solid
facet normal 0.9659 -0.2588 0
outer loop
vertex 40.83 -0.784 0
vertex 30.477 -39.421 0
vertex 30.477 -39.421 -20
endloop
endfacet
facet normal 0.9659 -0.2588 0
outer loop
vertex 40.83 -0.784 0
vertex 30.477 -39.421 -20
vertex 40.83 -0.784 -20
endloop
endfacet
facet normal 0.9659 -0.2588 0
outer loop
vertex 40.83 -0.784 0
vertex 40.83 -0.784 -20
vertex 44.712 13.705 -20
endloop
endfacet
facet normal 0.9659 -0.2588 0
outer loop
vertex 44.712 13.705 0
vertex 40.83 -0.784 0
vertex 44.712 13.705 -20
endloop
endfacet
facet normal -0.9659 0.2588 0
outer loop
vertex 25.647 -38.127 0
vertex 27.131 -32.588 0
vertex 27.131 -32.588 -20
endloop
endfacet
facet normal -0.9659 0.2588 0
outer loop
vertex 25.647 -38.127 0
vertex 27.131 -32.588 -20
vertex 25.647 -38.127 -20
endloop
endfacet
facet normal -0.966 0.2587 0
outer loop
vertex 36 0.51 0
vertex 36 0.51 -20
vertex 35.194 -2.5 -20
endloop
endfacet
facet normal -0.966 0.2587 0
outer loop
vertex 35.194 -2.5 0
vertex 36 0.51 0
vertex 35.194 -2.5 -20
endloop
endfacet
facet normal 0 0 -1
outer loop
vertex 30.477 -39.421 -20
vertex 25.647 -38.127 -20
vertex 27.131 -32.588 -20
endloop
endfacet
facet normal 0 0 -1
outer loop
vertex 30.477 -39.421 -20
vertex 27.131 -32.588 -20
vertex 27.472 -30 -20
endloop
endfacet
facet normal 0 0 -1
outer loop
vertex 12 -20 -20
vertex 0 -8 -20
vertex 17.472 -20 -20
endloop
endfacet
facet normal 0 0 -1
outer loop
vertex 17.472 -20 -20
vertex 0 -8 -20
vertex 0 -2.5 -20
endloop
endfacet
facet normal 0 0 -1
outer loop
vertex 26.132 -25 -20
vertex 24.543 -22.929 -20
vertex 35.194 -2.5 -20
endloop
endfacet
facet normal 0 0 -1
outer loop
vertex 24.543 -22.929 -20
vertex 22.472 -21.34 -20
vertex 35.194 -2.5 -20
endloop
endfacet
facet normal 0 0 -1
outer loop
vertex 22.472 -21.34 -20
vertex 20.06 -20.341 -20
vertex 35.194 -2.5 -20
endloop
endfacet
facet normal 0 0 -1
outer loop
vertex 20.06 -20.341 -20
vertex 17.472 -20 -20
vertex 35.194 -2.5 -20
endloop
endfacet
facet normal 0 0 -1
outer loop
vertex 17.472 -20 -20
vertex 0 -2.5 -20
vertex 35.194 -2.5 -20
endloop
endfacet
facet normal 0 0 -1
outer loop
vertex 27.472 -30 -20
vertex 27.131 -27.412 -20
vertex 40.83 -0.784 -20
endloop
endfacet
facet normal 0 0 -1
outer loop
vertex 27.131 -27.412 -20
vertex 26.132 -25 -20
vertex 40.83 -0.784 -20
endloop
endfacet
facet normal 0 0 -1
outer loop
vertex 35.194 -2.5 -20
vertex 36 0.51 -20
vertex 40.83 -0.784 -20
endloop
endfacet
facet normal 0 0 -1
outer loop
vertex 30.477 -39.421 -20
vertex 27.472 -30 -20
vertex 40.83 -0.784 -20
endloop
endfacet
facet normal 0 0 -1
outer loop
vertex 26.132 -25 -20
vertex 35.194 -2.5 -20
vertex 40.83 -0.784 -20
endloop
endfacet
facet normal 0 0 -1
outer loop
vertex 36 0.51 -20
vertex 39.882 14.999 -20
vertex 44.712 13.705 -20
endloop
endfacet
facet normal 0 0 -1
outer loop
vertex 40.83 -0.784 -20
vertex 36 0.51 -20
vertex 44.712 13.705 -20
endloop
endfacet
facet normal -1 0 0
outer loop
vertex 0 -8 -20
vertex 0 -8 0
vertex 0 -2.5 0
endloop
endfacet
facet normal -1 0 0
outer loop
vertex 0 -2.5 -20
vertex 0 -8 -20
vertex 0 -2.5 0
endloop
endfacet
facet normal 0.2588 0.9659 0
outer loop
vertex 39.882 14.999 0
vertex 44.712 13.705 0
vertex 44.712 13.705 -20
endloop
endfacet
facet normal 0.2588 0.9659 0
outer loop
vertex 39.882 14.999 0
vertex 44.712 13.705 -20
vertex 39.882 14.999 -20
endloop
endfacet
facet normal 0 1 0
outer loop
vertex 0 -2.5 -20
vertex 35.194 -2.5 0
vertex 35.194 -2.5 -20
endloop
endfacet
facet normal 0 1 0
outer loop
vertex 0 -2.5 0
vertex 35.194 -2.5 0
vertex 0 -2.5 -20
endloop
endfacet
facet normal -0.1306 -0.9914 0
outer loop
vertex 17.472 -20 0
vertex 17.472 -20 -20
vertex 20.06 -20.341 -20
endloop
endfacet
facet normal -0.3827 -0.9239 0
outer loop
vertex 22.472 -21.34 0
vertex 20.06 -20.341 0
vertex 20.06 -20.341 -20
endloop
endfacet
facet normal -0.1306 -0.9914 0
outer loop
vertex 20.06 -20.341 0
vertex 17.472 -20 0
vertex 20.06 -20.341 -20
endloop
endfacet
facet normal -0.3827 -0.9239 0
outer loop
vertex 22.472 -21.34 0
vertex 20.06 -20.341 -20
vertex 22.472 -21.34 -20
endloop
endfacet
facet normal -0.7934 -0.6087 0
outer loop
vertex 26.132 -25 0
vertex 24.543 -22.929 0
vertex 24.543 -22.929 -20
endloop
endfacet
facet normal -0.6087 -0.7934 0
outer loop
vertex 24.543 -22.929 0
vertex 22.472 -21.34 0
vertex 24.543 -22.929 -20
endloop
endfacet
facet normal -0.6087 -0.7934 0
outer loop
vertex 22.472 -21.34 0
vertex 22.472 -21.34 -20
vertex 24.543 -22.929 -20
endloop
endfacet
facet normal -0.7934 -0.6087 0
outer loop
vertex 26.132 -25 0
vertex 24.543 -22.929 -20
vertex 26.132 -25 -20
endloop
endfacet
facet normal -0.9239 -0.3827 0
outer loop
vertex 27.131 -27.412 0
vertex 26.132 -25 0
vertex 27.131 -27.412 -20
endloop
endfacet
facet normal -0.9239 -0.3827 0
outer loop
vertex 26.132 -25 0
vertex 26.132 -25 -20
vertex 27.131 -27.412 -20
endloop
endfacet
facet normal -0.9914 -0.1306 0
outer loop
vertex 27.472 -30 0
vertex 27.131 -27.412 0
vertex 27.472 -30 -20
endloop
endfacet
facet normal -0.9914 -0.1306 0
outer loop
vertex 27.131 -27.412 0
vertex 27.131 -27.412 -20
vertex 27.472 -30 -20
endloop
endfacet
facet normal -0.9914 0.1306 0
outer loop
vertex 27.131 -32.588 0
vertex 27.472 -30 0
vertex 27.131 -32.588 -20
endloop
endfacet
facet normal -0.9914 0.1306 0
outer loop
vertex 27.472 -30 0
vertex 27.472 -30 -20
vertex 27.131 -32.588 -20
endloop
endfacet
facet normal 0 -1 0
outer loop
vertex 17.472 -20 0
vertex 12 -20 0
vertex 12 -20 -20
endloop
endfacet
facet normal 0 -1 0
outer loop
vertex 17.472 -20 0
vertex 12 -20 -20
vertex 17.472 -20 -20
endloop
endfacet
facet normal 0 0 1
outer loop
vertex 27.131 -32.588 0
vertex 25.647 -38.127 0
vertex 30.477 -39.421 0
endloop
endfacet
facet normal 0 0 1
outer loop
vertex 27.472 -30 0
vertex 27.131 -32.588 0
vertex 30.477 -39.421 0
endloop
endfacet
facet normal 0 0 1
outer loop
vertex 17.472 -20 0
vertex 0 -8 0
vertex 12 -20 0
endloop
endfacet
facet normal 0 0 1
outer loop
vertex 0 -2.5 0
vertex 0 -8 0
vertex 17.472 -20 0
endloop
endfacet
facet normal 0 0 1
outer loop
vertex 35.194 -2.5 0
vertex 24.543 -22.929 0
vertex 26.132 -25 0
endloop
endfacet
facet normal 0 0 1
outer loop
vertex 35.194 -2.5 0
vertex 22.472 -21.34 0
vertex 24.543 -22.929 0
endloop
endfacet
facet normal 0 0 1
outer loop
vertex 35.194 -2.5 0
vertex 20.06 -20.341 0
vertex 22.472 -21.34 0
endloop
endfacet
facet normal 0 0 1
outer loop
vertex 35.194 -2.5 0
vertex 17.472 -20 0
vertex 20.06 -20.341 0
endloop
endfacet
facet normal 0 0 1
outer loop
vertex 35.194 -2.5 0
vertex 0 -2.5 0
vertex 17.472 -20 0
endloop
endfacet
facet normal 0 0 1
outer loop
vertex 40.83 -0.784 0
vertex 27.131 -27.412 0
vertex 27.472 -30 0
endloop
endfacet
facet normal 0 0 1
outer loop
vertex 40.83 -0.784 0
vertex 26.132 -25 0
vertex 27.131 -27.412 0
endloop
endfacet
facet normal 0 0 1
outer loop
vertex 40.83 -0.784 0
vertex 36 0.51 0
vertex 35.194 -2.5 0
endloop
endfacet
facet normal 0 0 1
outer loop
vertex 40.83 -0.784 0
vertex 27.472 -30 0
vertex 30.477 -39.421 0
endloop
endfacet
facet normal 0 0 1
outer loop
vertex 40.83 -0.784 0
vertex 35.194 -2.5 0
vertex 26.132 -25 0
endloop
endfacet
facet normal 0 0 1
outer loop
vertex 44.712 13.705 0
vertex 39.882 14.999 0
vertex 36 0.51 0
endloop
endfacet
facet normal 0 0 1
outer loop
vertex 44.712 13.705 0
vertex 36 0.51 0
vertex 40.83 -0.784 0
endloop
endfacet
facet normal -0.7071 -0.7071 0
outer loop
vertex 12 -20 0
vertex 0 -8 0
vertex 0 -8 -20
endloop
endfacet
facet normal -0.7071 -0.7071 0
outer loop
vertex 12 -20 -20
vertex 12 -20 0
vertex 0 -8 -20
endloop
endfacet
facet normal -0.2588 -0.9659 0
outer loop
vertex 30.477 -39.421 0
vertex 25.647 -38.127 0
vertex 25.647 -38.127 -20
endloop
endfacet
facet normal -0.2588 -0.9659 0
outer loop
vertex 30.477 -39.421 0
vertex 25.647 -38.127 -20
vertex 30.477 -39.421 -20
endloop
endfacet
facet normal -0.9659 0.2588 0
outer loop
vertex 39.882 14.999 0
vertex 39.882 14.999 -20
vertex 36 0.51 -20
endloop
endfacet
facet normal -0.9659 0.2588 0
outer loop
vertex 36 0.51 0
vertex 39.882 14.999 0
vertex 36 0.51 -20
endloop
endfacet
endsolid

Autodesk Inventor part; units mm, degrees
ref_plane "YZ Plane" through (0, 0, 0) normal (1, 0, 0) x (0, 1, 0)
sketch "Sketch1" plane through (0, 0, 0) normal (0, 0, 1) x (1, 0, 0)
  line L0 (36, 0.51) -> (25.6472, -38.1271)
  line L1 (36, 0.51) -> (76, 0.51) construction
  line L2 (36, 0.51) -> (25.6472, -38.1271) construction
  line L3 (25.6472, -38.1271) -> (30.4769, -39.4212)
  line L4 (30.4769, -39.4212) -> (40.8296, -0.7841)
  line L5 (40.8296, -0.7841) -> (36, 0.51)
  line L6 (36, 0.51) -> (40.8296, -0.7841)
  line L7 (40.8296, -0.7841) -> (44.7119, 13.7048)
  line L8 (44.7119, 13.7048) -> (39.8823, 14.9989)
  line L9 (39.8823, 14.9989) -> (36, 0.51)
  arc A0 (36, -1.5) -> (26, 8.5) centre (26, -1.5) ccw construction
  line L10 (39.0787, 12) -> (34.0787, 12)
  line L11 (34.0787, 12) -> (34.0787, 9)
  line L12 (34.0787, 9) -> (38.2749, 9)
  line L13 (14, -12.5) -> (26, -12.5) construction
  line L14 (0, -20) -> (30.5044, -20)
  line L15 (30.5044, -20) -> (35.8634, 0)
  line L16 (35.1935, -2.5) -> (0, -2.5)
  line L17 (35.1935, -2.5) -> (30.5044, -20)
  line L18 (0, -20) -> (0, -2.5)
  line L19 (-41.5, -2.5) -> (36, -2.5) construction
  line L20 (30.5044, -20) -> (35.1935, -2.5) construction
  point P0 (0, 0)
  point P1 (17.5967, -2.5)
  dimension "d0" = 40
  dimension "d1" = 105
  dimension "d2" = 5
  dimension "d3" = 15
  dimension "d5" = 5
  dimension "d6" = 3
  dimension "d7" = 11.49
  dimension "d20" = 17.5
  dimension "d21" = 35.1935
  dimension "d22" = 30.5044
ref_plane "Work Plane1" through (0, 0, -20) normal (0, 0, -1) x (0, 1, 0)
extrude "Extrusion1" add sketch "Sketch1" against normal up to surface (20 mm away) contours L5 L4 L3 L0 | L9 L8 L7 L5 | L0 L14 L18 L16
ref_plane "Work Plane6" through (36, 0, -14) normal (0, 0, 1) x (1, 0, 0)
ref_plane "Work Plane3" through (0, 0.51, -6) normal (0, 0, -1) x (0, 1, 0)
fillet "Fillet2" radius 10 1 edges at (30.5044, -20, -10)
chamfer "Chamfer1" distance 12 angle 45 1 edges at (0, -20, -10)
properties part number "Stand_Back"
